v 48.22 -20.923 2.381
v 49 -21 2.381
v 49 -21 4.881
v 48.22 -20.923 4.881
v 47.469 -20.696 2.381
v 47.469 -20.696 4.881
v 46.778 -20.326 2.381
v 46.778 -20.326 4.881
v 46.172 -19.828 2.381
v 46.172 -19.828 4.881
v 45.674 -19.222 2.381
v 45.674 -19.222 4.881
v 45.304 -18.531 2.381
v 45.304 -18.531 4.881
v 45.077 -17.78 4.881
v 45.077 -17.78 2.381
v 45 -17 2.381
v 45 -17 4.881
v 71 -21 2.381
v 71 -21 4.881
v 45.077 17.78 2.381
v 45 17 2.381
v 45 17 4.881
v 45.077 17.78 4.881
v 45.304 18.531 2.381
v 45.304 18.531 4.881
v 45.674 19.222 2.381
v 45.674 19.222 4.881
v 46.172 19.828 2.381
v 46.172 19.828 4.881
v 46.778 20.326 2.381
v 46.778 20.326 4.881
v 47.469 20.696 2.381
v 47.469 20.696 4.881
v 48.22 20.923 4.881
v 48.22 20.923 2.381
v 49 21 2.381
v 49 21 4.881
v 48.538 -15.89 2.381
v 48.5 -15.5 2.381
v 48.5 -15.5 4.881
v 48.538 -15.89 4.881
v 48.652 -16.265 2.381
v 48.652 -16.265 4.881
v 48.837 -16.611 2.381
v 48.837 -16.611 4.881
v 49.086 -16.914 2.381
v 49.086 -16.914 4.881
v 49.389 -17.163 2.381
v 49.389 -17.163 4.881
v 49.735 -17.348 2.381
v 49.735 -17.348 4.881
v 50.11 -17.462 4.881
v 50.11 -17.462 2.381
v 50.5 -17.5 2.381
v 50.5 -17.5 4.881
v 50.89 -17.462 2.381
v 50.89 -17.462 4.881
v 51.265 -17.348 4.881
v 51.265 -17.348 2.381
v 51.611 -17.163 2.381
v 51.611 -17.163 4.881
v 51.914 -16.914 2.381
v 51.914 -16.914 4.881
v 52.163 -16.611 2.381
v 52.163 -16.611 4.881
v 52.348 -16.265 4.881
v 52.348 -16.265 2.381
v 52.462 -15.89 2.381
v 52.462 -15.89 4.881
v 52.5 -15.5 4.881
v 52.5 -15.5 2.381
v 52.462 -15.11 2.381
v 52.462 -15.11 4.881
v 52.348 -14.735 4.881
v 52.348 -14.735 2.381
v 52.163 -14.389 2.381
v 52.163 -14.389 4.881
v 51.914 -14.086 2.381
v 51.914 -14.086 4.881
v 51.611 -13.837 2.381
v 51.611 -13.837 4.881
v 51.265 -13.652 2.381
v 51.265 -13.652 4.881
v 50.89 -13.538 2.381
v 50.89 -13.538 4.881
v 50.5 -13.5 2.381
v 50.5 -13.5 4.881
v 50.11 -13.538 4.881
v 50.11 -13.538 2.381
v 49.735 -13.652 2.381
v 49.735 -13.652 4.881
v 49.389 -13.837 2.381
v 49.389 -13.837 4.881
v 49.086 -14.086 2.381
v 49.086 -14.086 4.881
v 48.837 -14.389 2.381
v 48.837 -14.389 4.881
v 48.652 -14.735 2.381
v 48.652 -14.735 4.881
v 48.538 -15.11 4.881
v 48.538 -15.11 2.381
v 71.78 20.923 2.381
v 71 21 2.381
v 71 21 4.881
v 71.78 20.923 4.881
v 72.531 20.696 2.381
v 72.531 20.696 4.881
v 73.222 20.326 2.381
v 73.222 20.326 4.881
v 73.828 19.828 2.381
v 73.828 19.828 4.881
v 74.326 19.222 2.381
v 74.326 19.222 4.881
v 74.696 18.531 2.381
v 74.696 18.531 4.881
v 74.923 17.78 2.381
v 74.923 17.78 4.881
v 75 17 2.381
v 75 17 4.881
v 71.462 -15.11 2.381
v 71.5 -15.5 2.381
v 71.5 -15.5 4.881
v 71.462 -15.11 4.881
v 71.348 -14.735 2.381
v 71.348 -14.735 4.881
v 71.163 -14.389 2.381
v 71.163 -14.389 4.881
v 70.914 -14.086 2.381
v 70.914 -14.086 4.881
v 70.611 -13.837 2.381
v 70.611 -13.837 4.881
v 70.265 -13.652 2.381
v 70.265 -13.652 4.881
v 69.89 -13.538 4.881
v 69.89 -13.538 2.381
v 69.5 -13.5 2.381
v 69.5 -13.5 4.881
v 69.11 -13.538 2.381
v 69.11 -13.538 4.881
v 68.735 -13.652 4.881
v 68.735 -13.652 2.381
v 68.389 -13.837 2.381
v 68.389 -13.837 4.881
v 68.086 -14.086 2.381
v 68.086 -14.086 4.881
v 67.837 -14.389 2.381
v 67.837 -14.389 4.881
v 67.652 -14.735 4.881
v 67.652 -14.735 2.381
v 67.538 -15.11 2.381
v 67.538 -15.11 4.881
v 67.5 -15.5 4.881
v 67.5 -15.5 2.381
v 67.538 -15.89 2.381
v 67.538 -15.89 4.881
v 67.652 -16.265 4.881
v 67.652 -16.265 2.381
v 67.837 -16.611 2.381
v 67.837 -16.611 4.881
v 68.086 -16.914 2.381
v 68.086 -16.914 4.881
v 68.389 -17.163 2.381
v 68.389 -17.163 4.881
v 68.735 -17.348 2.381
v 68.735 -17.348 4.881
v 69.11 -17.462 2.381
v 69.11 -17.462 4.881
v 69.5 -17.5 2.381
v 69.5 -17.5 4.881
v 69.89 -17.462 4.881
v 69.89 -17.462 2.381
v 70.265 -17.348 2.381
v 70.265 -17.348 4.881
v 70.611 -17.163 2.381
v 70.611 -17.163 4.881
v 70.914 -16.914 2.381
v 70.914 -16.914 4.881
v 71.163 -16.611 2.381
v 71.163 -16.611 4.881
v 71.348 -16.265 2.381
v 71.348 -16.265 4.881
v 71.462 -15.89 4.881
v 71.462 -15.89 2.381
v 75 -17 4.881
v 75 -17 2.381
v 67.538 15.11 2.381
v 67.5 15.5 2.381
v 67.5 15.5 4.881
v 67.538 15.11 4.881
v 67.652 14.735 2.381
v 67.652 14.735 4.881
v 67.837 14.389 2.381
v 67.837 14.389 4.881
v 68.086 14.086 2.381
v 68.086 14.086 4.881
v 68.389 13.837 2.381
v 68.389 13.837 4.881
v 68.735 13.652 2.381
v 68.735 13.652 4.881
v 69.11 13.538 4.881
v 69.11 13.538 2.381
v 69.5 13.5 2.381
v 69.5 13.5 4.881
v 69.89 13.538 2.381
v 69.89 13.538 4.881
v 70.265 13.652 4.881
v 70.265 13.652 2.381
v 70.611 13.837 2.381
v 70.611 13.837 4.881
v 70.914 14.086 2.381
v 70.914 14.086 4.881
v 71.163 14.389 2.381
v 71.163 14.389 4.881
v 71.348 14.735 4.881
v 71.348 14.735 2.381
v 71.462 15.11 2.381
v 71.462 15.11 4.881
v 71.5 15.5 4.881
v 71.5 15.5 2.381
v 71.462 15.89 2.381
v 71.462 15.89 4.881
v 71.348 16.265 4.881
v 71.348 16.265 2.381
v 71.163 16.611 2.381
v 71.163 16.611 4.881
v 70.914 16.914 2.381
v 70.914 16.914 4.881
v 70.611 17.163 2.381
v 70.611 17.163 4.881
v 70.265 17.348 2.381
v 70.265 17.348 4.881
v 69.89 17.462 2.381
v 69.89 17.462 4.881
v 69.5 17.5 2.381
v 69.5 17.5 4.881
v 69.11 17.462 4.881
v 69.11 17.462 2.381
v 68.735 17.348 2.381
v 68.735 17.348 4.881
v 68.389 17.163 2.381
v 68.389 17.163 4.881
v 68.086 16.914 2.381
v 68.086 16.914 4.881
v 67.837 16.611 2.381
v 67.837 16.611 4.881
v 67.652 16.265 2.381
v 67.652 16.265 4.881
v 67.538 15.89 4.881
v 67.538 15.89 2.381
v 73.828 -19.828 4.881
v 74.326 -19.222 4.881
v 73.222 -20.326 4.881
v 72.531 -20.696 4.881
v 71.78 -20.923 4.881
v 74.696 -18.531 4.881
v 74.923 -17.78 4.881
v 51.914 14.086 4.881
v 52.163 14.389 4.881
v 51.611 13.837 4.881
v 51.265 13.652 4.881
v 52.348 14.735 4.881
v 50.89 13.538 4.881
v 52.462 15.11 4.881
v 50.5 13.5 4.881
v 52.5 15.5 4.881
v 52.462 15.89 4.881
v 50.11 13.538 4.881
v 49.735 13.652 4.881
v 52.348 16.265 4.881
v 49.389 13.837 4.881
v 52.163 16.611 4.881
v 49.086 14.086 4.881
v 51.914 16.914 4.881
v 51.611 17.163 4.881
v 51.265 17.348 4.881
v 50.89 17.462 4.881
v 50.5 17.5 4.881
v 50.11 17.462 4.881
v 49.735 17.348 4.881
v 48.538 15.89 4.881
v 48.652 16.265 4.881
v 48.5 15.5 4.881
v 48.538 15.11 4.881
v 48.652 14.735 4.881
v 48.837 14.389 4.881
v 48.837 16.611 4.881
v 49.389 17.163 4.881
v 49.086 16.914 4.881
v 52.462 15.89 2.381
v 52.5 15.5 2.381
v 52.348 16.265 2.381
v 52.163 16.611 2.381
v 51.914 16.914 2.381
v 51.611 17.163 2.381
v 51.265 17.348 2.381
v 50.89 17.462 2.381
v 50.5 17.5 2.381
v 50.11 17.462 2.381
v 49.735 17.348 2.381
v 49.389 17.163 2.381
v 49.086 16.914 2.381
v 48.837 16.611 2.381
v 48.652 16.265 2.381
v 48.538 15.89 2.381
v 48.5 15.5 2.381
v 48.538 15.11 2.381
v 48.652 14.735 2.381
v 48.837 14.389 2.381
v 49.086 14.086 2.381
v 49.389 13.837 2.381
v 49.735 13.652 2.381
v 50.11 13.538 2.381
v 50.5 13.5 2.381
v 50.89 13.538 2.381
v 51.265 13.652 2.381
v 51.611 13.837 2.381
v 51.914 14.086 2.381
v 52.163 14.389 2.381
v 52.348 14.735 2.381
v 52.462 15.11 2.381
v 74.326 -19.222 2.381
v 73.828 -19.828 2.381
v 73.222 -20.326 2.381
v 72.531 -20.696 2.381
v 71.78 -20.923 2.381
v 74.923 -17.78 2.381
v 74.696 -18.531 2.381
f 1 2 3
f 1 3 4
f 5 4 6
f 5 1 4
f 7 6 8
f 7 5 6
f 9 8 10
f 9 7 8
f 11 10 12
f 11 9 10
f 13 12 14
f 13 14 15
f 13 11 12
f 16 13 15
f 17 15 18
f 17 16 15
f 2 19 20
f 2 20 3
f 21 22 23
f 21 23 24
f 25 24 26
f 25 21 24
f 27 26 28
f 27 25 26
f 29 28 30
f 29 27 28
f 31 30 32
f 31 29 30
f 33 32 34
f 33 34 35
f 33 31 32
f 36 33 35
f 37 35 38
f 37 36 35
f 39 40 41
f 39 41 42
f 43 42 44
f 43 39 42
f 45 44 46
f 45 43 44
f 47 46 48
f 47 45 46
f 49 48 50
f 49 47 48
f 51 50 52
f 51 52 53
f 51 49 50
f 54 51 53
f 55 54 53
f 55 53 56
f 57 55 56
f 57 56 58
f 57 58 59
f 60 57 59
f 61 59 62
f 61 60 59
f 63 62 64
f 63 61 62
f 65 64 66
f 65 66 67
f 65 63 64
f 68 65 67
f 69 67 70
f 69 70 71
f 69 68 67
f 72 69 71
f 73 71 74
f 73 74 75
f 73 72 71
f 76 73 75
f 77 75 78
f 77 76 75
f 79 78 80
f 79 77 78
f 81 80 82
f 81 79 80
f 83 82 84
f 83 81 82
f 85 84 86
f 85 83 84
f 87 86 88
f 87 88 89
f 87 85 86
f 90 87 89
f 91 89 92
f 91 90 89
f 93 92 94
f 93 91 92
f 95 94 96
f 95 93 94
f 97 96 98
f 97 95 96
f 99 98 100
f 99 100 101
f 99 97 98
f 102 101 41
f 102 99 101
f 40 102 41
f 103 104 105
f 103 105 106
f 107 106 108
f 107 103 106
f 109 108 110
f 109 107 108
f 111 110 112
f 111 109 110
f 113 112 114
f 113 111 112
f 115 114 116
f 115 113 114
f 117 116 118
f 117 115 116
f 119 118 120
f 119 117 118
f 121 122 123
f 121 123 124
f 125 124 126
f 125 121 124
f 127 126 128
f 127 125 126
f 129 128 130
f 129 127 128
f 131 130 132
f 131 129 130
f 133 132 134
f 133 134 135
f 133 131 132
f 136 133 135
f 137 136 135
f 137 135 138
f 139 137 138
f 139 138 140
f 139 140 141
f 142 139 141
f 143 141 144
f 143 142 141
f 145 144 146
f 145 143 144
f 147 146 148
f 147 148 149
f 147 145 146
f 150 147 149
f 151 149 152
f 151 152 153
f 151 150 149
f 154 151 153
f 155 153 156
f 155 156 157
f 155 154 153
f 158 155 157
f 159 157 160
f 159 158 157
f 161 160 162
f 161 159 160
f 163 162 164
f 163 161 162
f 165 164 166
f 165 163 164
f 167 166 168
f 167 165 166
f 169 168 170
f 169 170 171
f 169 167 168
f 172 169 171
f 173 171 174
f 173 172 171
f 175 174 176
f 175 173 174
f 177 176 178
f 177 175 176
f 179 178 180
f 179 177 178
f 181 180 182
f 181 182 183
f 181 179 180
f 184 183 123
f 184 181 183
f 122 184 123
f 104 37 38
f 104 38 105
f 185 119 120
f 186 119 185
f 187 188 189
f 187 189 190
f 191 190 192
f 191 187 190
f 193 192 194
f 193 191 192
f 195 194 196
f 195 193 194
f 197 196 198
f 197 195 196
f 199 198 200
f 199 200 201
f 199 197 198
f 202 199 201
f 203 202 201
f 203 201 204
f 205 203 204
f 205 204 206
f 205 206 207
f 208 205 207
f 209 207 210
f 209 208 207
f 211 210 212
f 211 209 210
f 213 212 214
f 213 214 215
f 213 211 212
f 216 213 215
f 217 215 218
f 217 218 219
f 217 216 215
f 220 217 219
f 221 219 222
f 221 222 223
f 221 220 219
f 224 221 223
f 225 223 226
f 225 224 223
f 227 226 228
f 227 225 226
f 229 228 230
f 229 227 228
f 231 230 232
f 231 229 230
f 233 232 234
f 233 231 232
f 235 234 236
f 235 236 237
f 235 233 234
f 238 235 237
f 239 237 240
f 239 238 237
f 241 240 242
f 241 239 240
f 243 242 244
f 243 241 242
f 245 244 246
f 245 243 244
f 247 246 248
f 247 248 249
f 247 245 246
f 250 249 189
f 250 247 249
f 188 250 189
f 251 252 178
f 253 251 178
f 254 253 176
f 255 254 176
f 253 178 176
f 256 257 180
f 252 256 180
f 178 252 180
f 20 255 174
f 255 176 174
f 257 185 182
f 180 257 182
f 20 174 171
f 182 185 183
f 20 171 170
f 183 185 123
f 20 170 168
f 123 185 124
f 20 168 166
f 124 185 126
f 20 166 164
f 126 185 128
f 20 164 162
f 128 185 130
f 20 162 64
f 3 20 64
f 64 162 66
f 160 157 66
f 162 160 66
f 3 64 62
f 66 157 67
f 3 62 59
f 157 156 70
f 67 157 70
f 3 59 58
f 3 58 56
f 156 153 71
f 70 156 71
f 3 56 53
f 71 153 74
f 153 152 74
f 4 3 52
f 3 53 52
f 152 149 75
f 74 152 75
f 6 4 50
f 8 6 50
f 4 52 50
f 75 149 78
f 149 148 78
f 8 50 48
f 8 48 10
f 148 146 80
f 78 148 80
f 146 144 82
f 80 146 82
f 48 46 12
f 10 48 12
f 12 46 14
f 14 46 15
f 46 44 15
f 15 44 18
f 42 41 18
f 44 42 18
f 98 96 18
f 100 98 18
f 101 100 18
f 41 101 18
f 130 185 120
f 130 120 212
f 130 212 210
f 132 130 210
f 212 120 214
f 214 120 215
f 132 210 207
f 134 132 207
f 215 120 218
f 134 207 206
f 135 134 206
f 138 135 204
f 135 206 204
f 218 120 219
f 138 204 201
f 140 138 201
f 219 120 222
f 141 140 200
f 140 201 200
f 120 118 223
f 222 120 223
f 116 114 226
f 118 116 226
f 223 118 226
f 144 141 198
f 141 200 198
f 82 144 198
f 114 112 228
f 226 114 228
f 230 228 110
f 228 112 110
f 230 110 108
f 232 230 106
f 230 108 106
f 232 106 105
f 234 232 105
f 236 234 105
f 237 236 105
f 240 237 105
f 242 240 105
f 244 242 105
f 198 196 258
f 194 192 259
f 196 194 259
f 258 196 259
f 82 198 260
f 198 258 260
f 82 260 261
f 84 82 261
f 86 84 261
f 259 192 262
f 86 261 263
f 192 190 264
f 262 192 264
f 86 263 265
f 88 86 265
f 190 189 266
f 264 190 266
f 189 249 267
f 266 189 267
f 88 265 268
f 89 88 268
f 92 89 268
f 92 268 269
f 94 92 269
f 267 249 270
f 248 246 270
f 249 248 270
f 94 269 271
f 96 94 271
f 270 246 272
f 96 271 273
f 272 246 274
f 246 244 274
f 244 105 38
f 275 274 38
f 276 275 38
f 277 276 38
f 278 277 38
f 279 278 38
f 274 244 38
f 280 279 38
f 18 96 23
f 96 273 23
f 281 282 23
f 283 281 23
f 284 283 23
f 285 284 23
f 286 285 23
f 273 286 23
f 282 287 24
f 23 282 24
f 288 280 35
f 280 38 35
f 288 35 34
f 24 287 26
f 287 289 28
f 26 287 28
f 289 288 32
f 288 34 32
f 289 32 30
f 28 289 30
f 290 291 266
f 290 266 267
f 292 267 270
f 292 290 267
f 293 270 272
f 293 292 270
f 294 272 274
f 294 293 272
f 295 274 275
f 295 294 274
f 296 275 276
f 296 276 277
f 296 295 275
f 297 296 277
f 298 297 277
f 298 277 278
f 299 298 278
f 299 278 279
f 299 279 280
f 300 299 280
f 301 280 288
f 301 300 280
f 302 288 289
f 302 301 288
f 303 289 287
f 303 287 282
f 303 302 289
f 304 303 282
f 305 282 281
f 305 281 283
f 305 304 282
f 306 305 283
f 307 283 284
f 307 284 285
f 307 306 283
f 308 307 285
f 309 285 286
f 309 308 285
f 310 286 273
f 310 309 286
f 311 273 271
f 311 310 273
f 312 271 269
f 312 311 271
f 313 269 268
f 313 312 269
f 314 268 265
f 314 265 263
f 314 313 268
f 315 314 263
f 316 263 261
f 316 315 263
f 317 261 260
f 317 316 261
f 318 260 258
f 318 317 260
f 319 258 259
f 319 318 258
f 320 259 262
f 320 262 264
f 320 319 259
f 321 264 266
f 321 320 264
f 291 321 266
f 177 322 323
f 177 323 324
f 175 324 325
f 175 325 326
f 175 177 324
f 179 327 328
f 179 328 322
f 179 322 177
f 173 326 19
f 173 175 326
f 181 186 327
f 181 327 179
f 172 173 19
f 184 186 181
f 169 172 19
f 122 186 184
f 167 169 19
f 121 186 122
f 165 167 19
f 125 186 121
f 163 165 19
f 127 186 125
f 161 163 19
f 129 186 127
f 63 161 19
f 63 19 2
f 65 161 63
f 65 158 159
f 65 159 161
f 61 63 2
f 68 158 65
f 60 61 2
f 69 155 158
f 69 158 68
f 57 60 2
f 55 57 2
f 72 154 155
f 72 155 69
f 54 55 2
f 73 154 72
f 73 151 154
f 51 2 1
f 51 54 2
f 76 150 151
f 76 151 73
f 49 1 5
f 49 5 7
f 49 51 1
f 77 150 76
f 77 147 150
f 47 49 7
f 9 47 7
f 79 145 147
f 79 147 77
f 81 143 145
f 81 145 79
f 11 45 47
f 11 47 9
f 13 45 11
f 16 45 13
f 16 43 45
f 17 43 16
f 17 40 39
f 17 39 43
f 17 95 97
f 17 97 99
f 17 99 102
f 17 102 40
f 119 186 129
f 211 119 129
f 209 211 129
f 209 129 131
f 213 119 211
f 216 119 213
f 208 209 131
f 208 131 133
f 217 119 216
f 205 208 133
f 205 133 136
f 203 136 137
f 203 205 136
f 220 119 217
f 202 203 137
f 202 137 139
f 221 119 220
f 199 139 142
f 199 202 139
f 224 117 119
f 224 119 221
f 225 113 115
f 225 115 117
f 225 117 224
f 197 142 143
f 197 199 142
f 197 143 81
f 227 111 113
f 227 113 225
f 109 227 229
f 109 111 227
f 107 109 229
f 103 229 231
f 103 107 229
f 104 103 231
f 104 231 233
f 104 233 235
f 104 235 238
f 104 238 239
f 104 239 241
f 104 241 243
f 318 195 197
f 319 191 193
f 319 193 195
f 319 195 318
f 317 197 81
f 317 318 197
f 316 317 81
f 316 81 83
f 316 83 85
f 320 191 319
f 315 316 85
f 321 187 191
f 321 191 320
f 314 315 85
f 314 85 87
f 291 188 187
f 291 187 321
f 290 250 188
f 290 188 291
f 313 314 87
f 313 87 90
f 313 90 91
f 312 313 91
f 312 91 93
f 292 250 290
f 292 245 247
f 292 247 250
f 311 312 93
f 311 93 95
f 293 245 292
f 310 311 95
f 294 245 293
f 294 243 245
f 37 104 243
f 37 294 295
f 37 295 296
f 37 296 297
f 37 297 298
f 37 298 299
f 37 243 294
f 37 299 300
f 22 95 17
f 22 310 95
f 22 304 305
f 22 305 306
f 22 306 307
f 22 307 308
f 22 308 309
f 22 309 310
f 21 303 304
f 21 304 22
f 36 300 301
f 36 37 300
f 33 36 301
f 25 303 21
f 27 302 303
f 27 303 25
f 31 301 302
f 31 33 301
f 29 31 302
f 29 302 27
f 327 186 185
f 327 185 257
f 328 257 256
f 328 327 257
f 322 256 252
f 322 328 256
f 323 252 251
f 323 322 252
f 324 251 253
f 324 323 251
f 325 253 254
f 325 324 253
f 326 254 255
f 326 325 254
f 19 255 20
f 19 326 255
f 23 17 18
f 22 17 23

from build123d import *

# Parameters (mm, degrees)
SKETCH2_W               = 138
SKETCH2_H               = 42
SKETCH2_R               = 2
SKETCH2_R_2             = 3.5
SKETCH2_R_3             = 8.5
BOSS_EXTRUDE1_DEPTH     = 2.38125
SKETCH3_R               = 4
SKETCH3_R_2             = 2
CUT_EXTRUDE1_DEPTH      = 4
SKETCH4_R               = 3.175
SKETCH4_R_2             = 2
BOSS_EXTRUDE2_DEPTH     = 17.9
SKETCH6_R               = 2
CUT_EXTRUDE2_DEPTH      = 10
BOSS_EXTRUDE3_DEPTH     = 4.7625
SKETCH7_R               = 3.175
BOSS_EXTRUDE4_DEPTH     = 17.9
FILLET1_R               = 6.35
BOSS_EXTRUDE5_START     = -27.425
BOSS_EXTRUDE5_DEPTH     = 27.425
CUT_EXTRUDE4_START      = -4
SKETCH9_R               = 4
CUT_EXTRUDE4_DEPTH      = 4
SKETCH10_R              = 11.00455
CUT_EXTRUDE5_DEPTH      = 2.5
CUT_EXTRUDE6_DEPTH      = 123.578796086
CUT_EXTRUDE6_DEPTH_BACK = 123.578796086
SKETCH11_R              = 1.65
SKETCH12_R              = 2
BOSS_EXTRUDE6_DEPTH     = 2.5


with BuildPart() as part:
    # Sketch2 → Boss-Extrude1 (new, symmetric)
    with BuildSketch(Plane.XY):
        with Locations((48, 0)):
            Rectangle(SKETCH2_W, SKETCH2_H)
        with Locations(Location((34, -15.5, 0), (0, 0, 180))):
            Circle(SKETCH2_R, mode=Mode.SUBTRACT)
        with Locations(Location((34, 15.5, 0), (0, 0, 180))):
            Circle(SKETCH2_R, mode=Mode.SUBTRACT)
        with Locations(Location((0, 0, 0), (0, 0, 180))):
            Circle(SKETCH2_R_2, mode=Mode.SUBTRACT)
        with Locations(Location((60, 0, 0), (0, 0, 180))):
            Circle(SKETCH2_R_3, mode=Mode.SUBTRACT)
    boss_extrude1 = extrude(amount=BOSS_EXTRUDE1_DEPTH, both=True)

    # Sketch3 → Cut-Extrude1 (cut)
    # profile 1 of 6: a face of its own
    with BuildSketch(Plane(origin=(0, 0, -2.38125), x_dir=(-1, 0, 0), z_dir=(0, 0, -1))):
        with Locations((-34, -15.5)):
            Circle(SKETCH3_R)
    # profile 2 of 6: a face of its own
    with BuildSketch(Plane(origin=(0, 0, -2.38125), x_dir=(-1, 0, 0), z_dir=(0, 0, -1))):
        with Locations((-34, 15.5)):
            Circle(SKETCH3_R)
        with Locations((-34, 15.5)):
            Circle(SKETCH3_R_2, mode=Mode.SUBTRACT)
    # profile 3 of 6: a face of its own
    with BuildSketch(Plane(origin=(0, 0, -2.38125), x_dir=(-1, 0, 0), z_dir=(0, 0, -1))):
        with Locations((-15.5, 15.5)):
            Circle(SKETCH3_R)
    # profile 4 of 6: a face of its own
    with BuildSketch(Plane(origin=(0, 0, -2.38125), x_dir=(-1, 0, 0), z_dir=(0, 0, -1))):
        with Locations((15.5, 15.5)):
            Circle(SKETCH3_R)
    # profile 5 of 6: a face of its own
    with BuildSketch(Plane(origin=(0, 0, -2.38125), x_dir=(-1, 0, 0), z_dir=(0, 0, -1))):
        with Locations((-15.5, -15.5)):
            Circle(SKETCH3_R)
    # profile 6 of 6: a face of its own
    with BuildSketch(Plane(origin=(0, 0, -2.38125), x_dir=(-1, 0, 0), z_dir=(0, 0, -1))):
        with Locations((15.5, -15.5)):
            Circle(SKETCH3_R)
    extrude(amount=-CUT_EXTRUDE1_DEPTH, mode=Mode.SUBTRACT)

    # Sketch4 → Boss-Extrude2 (add)
    # profile 1 of 2: a face of its own
    with BuildSketch(Plane(origin=(0, 0, -2.38125), x_dir=(-1, 0, 0), z_dir=(0, 0, -1))):
        with Locations(Location((-111.5, -15.5, 0), (0, 0, 180))):
            Circle(SKETCH4_R)
        with Locations(Location((-111.5, -15.5, 0), (0, 0, 180))):
            Circle(SKETCH4_R_2, mode=Mode.SUBTRACT)
    # profile 2 of 2: a face of its own
    with BuildSketch(Plane(origin=(0, 0, -2.38125), x_dir=(-1, 0, 0), z_dir=(0, 0, -1))):
        with Locations(Location((-111.5, 15.5, 0), (0, 0, 180))):
            Circle(SKETCH4_R)
        with Locations(Location((-111.5, 15.5, 0), (0, 0, 180))):
            Circle(SKETCH4_R_2, mode=Mode.SUBTRACT)
    extrude(amount=BOSS_EXTRUDE2_DEPTH)

    # Sketch6 → Cut-Extrude2 (cut)
    with BuildSketch(Plane(origin=(0, 0, -2.38125), x_dir=(-1, 0, 0), z_dir=(0, 0, -1))):
        with Locations((-15.5, 15.5)):
            Circle(SKETCH6_R)
        with Locations((15.5, 15.5)):
            Circle(SKETCH6_R)
        with Locations((15.5, -15.5)):
            Circle(SKETCH6_R)
        with Locations((-15.5, -15.5)):
            Circle(SKETCH6_R)
    extrude(amount=-CUT_EXTRUDE2_DEPTH, mode=Mode.SUBTRACT)

    # Sketch5 → Boss-Extrude3 (add)
    with BuildSketch(Plane(origin=(0, 0, -2.38125), x_dir=(-1, 0, 0), z_dir=(0, 0, -1))):
        with BuildLine():
            Line((21, -21), (27.208091957, -0.938604379))
            ThreePointArc((27.208091957, -0.938604379), (27.35, 0), (27.208091957, 0.938604379))
            Line((27.208091957, 0.938604379), (21, 21))
            Line((21, 21), (21, -21))
        make_face()
    boss_extrude3 = extrude(amount=-BOSS_EXTRUDE3_DEPTH)

    # Mirror2: Boss-Extrude1, Boss-Extrude3 across plane
    add(boss_extrude1.mirror(Plane(origin=(0, 0, -11.33125), x_dir=(1, 0, 0), z_dir=(0, 0, -1))))
    add(boss_extrude3.mirror(Plane(origin=(0, 0, -11.33125), x_dir=(1, 0, 0), z_dir=(0, 0, -1))))

    # Sketch7 → Boss-Extrude4 (add)
    with BuildSketch(Plane.XY.offset(-20.28125)):
        with Locations(Location((-24.175, 0, 0), (0, 0, 197.194924512))):
            Circle(SKETCH7_R)
    extrude(amount=BOSS_EXTRUDE4_DEPTH)

    # Fillet1
    fillet1_edges = [part.edges().sort_by_distance(p)[0] for p in [
        (117, 21, -22.6625),
        (117, -21, -22.6625),
        (-21, -21, -22.6625),
        (-21, 21, -22.6625),
        (117, -21, 0),
        (-21, -21, 0),
        (-21, 21, 0),
        (117, 21, 0),
    ]]
    fillet(fillet1_edges, radius=FILLET1_R)

    # Sketch8 → Boss-Extrude5 (add)
    with BuildSketch(Plane(origin=(0, 0, -25.04375), x_dir=(-1, 0, 0), z_dir=(0, 0, -1)).offset(BOSS_EXTRUDE5_START)):
        with BuildLine():
            ThreePointArc((3.175, 21), (0, 24.175), (-3.175, 21))
            Line((-3.175, 21), (3.175, 21))
        make_face()
        with BuildLine():
            Line((3.175, -21), (-3.175, -21))
            ThreePointArc((-3.175, -21), (0, -24.175), (3.175, -21))
        make_face()
    extrude(amount=BOSS_EXTRUDE5_DEPTH)

    # Sketch9 → Cut-Extrude4 (cut)
    with BuildSketch(Plane.XY.offset(-20.28125).offset(CUT_EXTRUDE4_START)):
        with Locations(Location((34, -15.5, 0), (0, 0, 180))):
            Circle(SKETCH9_R)
        with Locations(Location((34, 15.5, 0), (0, 0, 180))):
            Circle(SKETCH9_R)
    extrude(amount=CUT_EXTRUDE4_DEPTH, mode=Mode.SUBTRACT)

    # Sketch10 → Cut-Extrude5 (cut)
    with BuildSketch(Plane.XY.offset(2.38125)):
        Circle(SKETCH10_R)
    extrude(amount=-CUT_EXTRUDE5_DEPTH, mode=Mode.SUBTRACT)

    # Sketch11 → Cut-Extrude6 (cut, two sides: drawn at the far end of the back side and taken through both)
    with BuildSketch(Plane.XY.offset(2.38125).offset(-CUT_EXTRUDE6_DEPTH_BACK)):
        with Locations((50.5, 15.5)):
            Circle(SKETCH11_R)
        with Locations(Location((69.5, 15.5, 0), (0, 0, 180))):
            Circle(SKETCH11_R)
        with Locations((69.5, -15.5)):
            Circle(SKETCH11_R)
        with Locations(Location((50.5, -15.5, 0), (0, 0, 180))):
            Circle(SKETCH11_R)
    extrude(amount=CUT_EXTRUDE6_DEPTH + CUT_EXTRUDE6_DEPTH_BACK, mode=Mode.SUBTRACT)


with BuildPart() as body_2:
    # Sketch12 → Boss-Extrude6 (new body)
    with BuildSketch(Plane.XY.offset(2.38125)):
        with BuildLine():
            Line((49, 21), (71, 21))
            ThreePointArc((71, 21), (73.828427125, 19.828427125), (75, 17))
            Line((75, 17), (75, -17))
            ThreePointArc((75, -17), (73.828427125, -19.828427125), (71, -21))
            Line((71, -21), (49, -21))
            ThreePointArc((49, -21), (46.171572875, -19.828427125), (45, -17))
            Line((45, -17), (45, 17))
            ThreePointArc((45, 17), (46.171572875, 19.828427125), (49, 21))
        make_face()
        with Locations((50.5, 15.5)):
            Circle(SKETCH12_R, mode=Mode.SUBTRACT)
        with Locations(Location((69.5, 15.5, 0), (0, 0, 180))):
            Circle(SKETCH12_R, mode=Mode.SUBTRACT)
        with Locations((69.5, -15.5)):
            Circle(SKETCH12_R, mode=Mode.SUBTRACT)
        with Locations(Location((50.5, -15.5, 0), (0, 0, 180))):
            Circle(SKETCH12_R, mode=Mode.SUBTRACT)
    extrude(amount=BOSS_EXTRUDE6_DEPTH)


solid = body_2.part
